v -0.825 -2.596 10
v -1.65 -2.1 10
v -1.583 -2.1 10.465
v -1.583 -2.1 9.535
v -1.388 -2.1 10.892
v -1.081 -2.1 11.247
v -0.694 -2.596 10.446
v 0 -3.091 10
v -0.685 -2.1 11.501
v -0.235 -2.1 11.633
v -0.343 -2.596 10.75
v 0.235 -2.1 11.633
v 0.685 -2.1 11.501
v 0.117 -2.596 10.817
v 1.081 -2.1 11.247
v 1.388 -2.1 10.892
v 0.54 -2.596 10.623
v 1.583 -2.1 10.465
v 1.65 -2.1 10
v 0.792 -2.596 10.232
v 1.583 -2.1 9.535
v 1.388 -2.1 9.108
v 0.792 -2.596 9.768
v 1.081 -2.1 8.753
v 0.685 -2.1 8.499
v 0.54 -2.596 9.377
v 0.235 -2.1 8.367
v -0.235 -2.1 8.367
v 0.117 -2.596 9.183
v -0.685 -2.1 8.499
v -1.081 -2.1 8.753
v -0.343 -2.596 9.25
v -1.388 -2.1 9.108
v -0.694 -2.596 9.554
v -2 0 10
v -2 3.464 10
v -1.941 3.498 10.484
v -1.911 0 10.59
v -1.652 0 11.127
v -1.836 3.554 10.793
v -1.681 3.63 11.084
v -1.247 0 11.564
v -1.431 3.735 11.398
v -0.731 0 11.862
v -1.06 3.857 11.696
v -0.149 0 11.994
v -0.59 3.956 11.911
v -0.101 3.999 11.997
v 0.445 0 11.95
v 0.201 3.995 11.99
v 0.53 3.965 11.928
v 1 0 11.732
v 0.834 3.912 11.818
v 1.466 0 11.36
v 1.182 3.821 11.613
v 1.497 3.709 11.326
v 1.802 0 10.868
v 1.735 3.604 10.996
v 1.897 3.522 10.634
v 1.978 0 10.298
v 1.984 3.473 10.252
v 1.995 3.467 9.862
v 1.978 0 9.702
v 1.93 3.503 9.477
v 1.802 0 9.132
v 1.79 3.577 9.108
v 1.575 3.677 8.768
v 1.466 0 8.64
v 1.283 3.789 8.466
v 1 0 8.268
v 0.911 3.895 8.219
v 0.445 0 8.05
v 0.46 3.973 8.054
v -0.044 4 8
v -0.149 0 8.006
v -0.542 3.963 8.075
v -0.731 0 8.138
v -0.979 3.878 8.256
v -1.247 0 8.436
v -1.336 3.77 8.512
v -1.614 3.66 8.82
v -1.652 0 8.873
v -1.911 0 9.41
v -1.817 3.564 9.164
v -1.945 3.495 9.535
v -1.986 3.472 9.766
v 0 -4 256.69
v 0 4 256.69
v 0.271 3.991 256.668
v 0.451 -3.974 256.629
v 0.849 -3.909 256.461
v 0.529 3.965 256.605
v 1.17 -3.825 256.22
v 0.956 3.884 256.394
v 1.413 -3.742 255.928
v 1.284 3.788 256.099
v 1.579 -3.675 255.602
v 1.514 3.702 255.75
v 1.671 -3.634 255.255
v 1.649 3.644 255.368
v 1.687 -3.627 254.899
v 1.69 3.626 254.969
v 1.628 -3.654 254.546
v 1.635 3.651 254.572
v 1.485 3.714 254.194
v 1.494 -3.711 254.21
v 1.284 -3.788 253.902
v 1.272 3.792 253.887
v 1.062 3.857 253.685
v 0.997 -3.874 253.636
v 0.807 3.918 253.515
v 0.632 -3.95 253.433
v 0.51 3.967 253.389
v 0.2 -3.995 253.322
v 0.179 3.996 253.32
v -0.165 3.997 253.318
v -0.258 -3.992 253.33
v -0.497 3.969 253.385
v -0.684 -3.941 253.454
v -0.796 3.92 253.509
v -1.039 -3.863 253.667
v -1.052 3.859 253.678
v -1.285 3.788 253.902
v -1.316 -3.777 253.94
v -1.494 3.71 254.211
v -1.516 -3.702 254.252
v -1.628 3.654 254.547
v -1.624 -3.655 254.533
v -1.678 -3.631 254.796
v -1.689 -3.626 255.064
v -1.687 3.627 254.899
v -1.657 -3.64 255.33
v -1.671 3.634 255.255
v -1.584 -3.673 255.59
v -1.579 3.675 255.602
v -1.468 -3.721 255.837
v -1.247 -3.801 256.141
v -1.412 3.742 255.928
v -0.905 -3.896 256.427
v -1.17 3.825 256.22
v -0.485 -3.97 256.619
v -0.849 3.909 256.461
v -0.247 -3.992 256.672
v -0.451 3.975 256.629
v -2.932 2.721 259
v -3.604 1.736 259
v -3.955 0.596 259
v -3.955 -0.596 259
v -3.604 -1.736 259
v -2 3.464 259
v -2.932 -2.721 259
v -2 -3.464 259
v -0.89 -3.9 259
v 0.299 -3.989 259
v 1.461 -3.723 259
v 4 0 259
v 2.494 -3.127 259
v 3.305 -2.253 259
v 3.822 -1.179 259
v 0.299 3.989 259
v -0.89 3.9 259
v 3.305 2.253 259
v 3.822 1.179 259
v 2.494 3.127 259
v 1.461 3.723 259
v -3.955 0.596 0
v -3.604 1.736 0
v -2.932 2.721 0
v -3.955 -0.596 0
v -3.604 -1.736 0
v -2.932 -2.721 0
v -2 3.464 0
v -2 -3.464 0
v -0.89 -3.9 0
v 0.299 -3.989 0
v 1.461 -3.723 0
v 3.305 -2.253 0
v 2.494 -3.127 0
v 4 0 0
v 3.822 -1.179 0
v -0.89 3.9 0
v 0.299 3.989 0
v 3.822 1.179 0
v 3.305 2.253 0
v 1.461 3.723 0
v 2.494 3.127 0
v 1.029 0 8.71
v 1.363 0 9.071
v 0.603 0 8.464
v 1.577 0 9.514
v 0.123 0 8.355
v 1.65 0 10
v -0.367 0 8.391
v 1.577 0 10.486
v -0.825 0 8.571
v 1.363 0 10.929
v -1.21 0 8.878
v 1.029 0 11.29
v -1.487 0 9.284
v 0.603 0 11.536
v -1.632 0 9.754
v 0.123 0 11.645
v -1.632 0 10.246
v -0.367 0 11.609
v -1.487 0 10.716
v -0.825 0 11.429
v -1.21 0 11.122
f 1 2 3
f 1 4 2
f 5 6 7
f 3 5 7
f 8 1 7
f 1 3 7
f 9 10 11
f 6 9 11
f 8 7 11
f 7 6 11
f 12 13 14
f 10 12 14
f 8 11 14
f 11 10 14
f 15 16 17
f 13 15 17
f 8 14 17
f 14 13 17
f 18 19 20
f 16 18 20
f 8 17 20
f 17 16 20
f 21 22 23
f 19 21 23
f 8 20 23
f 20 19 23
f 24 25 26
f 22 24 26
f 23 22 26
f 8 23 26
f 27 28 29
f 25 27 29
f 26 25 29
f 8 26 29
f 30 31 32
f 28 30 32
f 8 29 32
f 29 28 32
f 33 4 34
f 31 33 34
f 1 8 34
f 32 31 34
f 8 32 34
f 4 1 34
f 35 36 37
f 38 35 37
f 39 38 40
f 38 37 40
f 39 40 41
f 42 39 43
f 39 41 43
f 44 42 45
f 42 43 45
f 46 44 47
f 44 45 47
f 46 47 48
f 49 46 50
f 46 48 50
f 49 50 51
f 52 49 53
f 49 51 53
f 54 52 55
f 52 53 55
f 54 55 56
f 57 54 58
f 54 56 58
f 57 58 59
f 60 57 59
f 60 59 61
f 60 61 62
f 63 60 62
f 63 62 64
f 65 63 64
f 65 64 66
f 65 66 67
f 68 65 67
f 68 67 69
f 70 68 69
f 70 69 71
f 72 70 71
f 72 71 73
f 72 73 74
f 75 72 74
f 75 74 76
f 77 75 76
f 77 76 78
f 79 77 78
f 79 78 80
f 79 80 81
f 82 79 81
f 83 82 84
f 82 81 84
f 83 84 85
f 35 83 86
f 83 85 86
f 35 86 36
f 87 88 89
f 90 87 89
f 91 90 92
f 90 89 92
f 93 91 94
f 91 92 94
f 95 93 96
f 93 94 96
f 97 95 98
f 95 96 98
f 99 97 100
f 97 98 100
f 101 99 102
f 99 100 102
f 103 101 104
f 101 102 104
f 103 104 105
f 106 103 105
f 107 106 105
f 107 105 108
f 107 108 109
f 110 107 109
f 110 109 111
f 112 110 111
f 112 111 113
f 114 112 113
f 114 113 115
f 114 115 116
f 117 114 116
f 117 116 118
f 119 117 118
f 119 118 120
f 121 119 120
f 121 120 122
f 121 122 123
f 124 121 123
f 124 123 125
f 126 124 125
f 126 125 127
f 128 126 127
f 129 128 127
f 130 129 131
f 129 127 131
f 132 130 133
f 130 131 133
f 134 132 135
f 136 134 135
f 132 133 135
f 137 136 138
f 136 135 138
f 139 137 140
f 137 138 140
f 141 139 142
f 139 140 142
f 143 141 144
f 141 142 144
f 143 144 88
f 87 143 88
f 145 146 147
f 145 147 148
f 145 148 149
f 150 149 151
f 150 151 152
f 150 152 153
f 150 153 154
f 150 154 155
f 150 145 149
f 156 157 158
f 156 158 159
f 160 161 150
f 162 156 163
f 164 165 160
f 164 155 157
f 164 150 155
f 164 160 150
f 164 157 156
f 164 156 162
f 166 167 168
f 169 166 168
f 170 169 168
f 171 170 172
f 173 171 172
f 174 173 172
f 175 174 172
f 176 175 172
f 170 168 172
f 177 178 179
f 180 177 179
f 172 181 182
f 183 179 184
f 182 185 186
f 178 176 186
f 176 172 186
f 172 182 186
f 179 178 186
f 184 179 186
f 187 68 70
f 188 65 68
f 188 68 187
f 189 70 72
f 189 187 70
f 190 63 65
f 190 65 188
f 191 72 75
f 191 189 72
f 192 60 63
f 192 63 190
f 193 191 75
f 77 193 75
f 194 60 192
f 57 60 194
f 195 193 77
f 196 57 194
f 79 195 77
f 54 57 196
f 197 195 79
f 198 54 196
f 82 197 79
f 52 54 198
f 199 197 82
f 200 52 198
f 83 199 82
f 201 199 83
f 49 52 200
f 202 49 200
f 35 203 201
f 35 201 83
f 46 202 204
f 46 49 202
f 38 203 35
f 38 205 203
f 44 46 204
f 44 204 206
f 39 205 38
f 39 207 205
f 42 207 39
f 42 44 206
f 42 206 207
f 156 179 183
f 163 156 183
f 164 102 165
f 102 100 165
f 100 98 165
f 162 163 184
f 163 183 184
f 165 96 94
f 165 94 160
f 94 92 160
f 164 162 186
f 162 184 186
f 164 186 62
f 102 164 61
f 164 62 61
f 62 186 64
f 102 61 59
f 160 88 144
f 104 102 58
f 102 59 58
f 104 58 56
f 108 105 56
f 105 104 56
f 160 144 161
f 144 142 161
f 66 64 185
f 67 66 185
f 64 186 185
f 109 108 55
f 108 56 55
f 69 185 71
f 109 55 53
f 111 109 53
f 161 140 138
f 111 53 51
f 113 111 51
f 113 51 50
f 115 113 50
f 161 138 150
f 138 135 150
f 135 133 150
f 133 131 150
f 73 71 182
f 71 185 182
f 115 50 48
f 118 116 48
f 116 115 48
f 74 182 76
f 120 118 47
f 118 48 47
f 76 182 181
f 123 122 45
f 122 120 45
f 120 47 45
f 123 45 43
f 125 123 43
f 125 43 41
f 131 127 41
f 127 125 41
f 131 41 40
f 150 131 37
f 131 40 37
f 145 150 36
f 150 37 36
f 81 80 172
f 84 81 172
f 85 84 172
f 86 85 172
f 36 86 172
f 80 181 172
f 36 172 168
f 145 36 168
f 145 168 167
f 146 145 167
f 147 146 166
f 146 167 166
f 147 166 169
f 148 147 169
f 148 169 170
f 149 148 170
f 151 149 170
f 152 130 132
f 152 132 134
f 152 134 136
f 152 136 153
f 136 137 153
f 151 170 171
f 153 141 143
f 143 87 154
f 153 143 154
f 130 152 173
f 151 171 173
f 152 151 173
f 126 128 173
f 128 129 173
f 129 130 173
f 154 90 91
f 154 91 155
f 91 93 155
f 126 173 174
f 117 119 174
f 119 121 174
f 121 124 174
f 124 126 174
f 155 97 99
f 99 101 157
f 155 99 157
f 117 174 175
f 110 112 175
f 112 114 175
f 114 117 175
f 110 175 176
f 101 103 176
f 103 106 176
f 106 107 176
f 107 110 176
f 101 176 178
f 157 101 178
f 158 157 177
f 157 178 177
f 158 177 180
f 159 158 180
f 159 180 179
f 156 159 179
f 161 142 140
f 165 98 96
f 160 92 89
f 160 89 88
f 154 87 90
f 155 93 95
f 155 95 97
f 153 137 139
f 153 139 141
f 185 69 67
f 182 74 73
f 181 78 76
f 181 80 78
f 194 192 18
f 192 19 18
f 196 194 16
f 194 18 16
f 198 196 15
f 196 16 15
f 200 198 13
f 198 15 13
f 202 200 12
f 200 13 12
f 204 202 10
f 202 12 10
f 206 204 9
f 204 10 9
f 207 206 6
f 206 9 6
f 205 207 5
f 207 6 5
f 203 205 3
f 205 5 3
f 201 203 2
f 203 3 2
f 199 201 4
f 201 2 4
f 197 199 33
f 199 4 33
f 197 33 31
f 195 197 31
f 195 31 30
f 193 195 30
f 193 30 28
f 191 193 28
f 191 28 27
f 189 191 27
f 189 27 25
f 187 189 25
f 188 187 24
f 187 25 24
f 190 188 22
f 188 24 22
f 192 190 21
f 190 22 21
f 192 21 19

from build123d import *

# Parameters (mm, degrees)
SKETCH_1_R                   = 4
EXTRUDE_1_DEPTH              = 259
HOLE_WIZARD_M4_2_D           = 3.3
HOLE_WIZARD_M4_2_DEPTH       = 6.1
HOLE_WIZARD_M4_2_CBORE_D     = 4
HOLE_WIZARD_M4_2_CBORE_DEPTH = 4
HOLE_WIZARD_M4_2_TIP         = 0.991420021
SKETCH_7_R                   = 1.69
CUT_EXTRUDE_1_DEPTH          = 260.154394241


with BuildPart() as part:
    # 草图1 → 拉伸1 (new body)
    with BuildSketch(Plane.XY):
        Circle(SKETCH_1_R)
    extrude(amount=EXTRUDE_1_DEPTH)

    # M4 螺纹孔2
    with Locations(Plane(origin=(0, 4, 0), x_dir=(-1, 0, 0), z_dir=(0, 1, 0))):
        with Locations((0, 10)):
            CounterBoreHole(HOLE_WIZARD_M4_2_D / 2, HOLE_WIZARD_M4_2_CBORE_D / 2, HOLE_WIZARD_M4_2_CBORE_DEPTH, depth=HOLE_WIZARD_M4_2_DEPTH)
            with Locations((0, 0, -(HOLE_WIZARD_M4_2_DEPTH + HOLE_WIZARD_M4_2_TIP / 2))):  # 118° drill point
                Cone(0, HOLE_WIZARD_M4_2_D / 2, HOLE_WIZARD_M4_2_TIP, mode=Mode.SUBTRACT)

    # 草图7 → 切除-拉伸1 (cut, through all)
    with BuildSketch(Plane(origin=(0, 4, 0), x_dir=(-1, 0, 0), z_dir=(0, 1, 0))):
        with Locations(Location((0, 255, 0), (0, 0, 90))):
            Circle(SKETCH_7_R)
    extrude(amount=-CUT_EXTRUDE_1_DEPTH, mode=Mode.SUBTRACT)


solid = part.part
